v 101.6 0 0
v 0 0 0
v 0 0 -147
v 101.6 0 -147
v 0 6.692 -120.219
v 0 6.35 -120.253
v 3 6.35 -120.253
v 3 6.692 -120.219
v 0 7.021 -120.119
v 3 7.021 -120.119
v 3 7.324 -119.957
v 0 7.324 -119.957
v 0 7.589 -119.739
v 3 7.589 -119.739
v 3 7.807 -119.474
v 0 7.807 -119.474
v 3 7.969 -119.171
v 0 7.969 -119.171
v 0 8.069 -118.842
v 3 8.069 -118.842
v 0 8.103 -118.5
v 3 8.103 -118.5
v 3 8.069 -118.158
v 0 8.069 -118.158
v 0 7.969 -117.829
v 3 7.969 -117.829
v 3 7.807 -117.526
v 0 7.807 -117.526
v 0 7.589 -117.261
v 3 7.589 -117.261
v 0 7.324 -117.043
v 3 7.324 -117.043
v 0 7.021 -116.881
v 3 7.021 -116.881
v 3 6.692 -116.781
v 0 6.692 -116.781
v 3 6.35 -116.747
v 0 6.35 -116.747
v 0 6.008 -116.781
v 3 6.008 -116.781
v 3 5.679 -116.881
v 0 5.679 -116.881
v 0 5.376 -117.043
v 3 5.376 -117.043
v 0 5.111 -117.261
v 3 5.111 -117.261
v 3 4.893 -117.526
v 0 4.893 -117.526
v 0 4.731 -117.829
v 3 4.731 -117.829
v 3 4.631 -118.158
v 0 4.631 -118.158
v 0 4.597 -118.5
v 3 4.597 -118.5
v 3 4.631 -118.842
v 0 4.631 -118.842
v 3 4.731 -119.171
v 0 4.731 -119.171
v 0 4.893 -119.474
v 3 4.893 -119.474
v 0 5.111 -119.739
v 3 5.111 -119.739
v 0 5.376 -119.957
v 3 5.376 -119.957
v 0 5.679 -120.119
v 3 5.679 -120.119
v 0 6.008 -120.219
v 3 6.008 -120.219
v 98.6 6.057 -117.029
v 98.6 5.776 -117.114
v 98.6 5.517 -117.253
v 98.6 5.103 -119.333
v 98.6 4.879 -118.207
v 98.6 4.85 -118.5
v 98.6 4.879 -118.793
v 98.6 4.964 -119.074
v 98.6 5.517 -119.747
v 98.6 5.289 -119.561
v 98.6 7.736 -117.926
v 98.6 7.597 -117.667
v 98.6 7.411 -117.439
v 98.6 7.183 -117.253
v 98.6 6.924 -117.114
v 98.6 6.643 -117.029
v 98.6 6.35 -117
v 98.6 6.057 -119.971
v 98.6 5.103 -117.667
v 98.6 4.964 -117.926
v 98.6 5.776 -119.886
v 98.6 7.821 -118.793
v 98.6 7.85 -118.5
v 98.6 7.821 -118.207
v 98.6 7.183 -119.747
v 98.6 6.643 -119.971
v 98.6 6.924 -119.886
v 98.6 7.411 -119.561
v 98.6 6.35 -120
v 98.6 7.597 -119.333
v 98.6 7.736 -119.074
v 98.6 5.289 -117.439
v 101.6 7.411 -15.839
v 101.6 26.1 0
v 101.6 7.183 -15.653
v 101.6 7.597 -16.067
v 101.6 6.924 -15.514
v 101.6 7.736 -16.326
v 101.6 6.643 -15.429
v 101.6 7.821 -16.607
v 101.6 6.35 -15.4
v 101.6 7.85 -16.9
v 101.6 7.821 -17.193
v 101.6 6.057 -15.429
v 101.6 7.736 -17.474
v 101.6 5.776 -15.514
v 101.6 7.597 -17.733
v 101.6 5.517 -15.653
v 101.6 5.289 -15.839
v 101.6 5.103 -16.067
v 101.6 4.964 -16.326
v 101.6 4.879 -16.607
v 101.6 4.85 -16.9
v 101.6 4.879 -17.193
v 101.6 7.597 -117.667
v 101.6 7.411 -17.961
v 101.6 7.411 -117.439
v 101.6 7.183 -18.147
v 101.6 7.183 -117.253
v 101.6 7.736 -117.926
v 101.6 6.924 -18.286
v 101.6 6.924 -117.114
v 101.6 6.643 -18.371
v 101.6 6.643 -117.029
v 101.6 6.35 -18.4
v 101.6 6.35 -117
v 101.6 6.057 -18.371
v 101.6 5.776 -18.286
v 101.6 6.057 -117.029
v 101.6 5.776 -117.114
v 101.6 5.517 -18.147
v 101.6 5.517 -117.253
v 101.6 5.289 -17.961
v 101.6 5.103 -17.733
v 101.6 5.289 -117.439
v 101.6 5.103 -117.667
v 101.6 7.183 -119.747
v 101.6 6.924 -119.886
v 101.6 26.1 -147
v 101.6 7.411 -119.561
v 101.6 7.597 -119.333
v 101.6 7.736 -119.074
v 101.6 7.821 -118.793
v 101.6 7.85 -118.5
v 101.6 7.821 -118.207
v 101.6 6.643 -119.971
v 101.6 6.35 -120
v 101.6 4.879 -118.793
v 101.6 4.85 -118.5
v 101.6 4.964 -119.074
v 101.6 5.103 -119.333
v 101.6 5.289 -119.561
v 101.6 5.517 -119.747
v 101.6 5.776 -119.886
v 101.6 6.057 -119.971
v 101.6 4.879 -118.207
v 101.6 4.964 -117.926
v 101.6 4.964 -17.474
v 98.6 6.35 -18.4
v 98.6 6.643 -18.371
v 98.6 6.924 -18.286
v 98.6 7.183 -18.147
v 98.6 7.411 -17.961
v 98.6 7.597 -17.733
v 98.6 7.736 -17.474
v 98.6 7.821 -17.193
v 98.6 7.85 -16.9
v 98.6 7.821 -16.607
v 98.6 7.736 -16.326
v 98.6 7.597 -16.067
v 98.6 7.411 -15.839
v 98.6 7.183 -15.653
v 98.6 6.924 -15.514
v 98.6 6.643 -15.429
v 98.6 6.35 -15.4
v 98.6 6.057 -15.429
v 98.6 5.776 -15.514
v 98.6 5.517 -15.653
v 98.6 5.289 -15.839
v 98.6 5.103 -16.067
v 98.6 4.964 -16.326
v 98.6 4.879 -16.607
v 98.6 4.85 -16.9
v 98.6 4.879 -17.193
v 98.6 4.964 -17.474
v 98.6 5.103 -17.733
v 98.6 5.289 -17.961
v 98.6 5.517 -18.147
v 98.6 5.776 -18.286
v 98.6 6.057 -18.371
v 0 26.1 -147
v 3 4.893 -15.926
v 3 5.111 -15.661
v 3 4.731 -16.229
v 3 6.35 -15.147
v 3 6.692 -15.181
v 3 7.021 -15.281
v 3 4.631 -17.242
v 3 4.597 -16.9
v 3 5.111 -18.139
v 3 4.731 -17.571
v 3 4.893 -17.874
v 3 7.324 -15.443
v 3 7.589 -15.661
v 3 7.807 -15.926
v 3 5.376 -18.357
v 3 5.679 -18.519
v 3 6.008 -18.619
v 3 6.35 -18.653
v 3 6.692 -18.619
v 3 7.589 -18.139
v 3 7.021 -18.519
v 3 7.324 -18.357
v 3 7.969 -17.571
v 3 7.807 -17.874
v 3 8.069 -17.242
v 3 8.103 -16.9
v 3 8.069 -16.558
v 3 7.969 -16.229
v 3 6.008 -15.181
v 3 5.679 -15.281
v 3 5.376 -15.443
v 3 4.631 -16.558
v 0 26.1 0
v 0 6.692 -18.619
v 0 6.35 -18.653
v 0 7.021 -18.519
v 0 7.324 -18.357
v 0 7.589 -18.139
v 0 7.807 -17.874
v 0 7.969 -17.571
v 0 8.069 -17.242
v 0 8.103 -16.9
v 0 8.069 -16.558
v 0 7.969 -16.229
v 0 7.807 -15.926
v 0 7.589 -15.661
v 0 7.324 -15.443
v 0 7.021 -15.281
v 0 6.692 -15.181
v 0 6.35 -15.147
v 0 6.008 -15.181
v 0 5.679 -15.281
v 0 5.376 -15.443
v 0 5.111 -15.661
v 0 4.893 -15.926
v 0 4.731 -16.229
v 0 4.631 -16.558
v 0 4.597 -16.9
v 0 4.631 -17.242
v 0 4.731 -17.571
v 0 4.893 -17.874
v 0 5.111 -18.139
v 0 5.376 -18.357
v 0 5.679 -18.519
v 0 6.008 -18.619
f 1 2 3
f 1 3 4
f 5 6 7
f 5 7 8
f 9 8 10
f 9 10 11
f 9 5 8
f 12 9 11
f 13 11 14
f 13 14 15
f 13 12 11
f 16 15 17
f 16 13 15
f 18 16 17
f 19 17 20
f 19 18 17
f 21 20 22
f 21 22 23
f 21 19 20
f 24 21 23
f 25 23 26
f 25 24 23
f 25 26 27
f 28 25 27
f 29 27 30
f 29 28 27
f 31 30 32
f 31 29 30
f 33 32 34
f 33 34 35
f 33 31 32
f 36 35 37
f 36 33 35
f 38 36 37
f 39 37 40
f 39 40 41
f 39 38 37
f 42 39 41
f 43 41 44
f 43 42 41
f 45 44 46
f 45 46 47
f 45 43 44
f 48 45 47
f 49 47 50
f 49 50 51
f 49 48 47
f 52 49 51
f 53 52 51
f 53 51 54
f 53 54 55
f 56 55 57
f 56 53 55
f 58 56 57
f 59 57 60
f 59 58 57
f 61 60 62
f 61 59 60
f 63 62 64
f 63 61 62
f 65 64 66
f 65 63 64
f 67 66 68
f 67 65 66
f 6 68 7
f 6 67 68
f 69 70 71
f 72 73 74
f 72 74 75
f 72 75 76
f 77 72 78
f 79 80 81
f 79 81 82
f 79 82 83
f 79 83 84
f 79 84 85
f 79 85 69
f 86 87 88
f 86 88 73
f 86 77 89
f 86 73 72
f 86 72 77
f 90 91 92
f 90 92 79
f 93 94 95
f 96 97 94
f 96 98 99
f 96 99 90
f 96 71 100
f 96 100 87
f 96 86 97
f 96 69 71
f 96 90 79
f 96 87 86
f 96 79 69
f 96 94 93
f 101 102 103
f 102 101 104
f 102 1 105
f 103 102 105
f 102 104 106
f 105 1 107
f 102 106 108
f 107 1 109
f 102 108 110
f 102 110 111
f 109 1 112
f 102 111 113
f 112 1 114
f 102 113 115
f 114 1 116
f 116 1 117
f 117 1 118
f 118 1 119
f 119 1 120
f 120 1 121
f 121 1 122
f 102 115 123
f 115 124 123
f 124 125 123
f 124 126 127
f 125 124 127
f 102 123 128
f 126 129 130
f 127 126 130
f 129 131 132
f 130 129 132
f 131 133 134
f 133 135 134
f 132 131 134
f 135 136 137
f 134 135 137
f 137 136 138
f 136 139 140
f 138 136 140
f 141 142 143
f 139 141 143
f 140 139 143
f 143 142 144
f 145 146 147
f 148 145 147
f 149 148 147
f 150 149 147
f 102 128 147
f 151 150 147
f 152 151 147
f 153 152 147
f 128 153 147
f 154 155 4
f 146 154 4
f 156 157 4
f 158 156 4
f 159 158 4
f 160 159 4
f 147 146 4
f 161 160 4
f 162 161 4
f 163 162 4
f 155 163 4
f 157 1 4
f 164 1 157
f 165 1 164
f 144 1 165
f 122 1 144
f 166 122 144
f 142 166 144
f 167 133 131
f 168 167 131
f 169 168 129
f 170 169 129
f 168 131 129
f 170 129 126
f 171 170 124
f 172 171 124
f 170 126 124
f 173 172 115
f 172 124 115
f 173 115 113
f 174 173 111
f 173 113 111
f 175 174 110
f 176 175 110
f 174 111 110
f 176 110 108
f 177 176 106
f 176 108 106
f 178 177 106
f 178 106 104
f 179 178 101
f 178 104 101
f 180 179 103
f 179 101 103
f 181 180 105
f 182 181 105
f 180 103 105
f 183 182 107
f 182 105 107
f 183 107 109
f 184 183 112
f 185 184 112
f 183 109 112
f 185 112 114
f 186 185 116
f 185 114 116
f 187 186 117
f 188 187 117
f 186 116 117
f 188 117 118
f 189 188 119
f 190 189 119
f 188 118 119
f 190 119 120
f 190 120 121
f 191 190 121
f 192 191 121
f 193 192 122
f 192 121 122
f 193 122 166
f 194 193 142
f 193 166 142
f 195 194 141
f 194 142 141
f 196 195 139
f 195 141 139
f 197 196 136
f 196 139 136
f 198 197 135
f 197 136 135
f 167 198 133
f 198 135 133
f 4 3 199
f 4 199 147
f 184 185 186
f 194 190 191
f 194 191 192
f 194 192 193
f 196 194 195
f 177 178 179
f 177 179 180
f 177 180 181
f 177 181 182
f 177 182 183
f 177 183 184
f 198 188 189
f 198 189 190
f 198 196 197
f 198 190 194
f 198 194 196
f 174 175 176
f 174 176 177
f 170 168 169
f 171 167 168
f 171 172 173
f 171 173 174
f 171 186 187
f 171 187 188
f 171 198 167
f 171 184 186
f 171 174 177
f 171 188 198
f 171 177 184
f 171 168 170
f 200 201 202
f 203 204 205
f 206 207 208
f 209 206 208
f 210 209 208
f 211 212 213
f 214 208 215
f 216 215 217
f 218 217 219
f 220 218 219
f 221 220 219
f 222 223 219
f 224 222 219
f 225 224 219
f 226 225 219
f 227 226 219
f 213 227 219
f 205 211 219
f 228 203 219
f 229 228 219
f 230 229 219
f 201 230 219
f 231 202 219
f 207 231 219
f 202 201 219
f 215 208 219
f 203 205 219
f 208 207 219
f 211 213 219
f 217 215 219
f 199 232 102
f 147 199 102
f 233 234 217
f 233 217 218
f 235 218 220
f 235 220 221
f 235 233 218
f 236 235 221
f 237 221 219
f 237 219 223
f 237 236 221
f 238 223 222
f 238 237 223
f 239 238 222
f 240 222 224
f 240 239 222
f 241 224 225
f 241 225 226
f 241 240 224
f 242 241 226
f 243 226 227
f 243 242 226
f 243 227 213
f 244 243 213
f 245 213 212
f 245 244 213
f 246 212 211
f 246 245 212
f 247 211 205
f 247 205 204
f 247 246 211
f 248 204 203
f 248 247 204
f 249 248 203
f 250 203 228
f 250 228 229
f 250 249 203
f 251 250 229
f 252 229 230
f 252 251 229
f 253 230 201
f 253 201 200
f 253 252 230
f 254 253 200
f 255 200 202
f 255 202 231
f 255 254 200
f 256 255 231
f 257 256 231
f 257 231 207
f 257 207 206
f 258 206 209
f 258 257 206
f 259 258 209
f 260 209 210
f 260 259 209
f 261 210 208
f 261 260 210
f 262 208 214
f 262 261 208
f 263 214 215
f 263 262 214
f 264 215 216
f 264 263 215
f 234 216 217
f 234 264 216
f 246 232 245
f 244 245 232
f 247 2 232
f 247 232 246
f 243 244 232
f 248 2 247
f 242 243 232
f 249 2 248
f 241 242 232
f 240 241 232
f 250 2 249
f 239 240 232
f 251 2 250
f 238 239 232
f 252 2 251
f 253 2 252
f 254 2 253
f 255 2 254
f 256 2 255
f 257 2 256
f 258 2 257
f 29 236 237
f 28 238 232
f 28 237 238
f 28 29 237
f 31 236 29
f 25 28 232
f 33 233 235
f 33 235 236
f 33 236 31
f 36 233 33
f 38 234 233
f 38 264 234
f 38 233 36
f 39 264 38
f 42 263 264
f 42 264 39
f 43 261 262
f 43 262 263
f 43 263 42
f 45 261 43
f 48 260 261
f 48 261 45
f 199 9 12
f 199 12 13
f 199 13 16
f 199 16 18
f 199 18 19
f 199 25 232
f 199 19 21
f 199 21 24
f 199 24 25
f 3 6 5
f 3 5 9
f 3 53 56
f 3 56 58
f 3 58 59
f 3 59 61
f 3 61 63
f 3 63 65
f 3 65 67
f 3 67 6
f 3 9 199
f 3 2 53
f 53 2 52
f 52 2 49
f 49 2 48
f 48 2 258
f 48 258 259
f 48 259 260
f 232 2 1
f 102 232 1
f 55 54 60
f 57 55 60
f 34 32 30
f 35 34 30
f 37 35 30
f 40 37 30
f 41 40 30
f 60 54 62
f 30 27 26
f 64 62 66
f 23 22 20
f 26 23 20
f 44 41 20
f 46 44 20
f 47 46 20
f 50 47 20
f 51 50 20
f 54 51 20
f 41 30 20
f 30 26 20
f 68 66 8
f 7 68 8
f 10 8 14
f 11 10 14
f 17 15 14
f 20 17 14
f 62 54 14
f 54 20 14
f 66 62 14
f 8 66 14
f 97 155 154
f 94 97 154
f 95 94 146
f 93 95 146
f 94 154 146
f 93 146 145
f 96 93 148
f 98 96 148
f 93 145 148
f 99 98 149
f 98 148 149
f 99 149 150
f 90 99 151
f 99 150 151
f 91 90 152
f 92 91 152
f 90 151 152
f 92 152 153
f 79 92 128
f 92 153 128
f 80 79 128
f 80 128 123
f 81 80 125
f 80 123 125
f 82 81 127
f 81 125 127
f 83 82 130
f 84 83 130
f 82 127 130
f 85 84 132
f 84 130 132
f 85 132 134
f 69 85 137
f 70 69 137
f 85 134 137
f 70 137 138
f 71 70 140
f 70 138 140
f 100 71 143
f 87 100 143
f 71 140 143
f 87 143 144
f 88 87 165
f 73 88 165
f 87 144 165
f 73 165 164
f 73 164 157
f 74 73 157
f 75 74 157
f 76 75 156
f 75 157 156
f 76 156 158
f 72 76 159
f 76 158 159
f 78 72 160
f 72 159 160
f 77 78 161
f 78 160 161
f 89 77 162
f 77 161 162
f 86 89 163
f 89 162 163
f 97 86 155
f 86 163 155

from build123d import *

# Parameters (mm, degrees)
SKETCH1_W           = 101.6
SKETCH1_H           = 147
BOSS_EXTRUDE1_DEPTH = 26.1
SKETCH2_R           = 1.7526
BOSS_EXTRUDE2_DEPTH = 3.175
SKETCH2_2_R         = 1.7526
CUT_EXTRUDE2_DEPTH  = 3
SKETCH4_R           = 1.5
CUT_EXTRUDE3_DEPTH  = 3


with BuildPart() as part:
    # Sketch1 → Boss-Extrude1 (new body)
    with BuildSketch(Plane(origin=(0, 0, 0), x_dir=(1, 0, 0), z_dir=(0, 1, 0))):
        with Locations((50.8, 73.5)):
            Rectangle(SKETCH1_W, SKETCH1_H)
    extrude(amount=BOSS_EXTRUDE1_DEPTH)

    # Sketch2 → Boss-Extrude2 (add)
    with BuildSketch(Plane(origin=(0, 0, 0), x_dir=(0, 0, -1), z_dir=(1, 0, 0))):
        with Locations((16.9, 6.35)):
            Circle(SKETCH2_R)
        with Locations((118.5, 6.35)):
            Circle(SKETCH2_R)
    extrude(amount=BOSS_EXTRUDE2_DEPTH)

    # Sketch2<2> → Cut-Extrude2 (cut)
    with BuildSketch(Plane(origin=(0, 0, 0), x_dir=(0, 0, -1), z_dir=(1, 0, 0))):
        with Locations((16.9, 6.35)):
            Circle(SKETCH2_2_R)
        with Locations((118.5, 6.35)):
            Circle(SKETCH2_2_R)
    extrude(amount=CUT_EXTRUDE2_DEPTH, mode=Mode.SUBTRACT)

    # Sketch4 → Cut-Extrude3 (cut)
    with BuildSketch(Plane(origin=(101.6, 0, 0), x_dir=(0, 0, -1), z_dir=(1, 0, 0))):
        with Locations((118.5, 6.35)):
            Circle(SKETCH4_R)
        with Locations((16.9, 6.35)):
            Circle(SKETCH4_R)
    extrude(amount=-CUT_EXTRUDE3_DEPTH, mode=Mode.SUBTRACT)


solid = part.part
